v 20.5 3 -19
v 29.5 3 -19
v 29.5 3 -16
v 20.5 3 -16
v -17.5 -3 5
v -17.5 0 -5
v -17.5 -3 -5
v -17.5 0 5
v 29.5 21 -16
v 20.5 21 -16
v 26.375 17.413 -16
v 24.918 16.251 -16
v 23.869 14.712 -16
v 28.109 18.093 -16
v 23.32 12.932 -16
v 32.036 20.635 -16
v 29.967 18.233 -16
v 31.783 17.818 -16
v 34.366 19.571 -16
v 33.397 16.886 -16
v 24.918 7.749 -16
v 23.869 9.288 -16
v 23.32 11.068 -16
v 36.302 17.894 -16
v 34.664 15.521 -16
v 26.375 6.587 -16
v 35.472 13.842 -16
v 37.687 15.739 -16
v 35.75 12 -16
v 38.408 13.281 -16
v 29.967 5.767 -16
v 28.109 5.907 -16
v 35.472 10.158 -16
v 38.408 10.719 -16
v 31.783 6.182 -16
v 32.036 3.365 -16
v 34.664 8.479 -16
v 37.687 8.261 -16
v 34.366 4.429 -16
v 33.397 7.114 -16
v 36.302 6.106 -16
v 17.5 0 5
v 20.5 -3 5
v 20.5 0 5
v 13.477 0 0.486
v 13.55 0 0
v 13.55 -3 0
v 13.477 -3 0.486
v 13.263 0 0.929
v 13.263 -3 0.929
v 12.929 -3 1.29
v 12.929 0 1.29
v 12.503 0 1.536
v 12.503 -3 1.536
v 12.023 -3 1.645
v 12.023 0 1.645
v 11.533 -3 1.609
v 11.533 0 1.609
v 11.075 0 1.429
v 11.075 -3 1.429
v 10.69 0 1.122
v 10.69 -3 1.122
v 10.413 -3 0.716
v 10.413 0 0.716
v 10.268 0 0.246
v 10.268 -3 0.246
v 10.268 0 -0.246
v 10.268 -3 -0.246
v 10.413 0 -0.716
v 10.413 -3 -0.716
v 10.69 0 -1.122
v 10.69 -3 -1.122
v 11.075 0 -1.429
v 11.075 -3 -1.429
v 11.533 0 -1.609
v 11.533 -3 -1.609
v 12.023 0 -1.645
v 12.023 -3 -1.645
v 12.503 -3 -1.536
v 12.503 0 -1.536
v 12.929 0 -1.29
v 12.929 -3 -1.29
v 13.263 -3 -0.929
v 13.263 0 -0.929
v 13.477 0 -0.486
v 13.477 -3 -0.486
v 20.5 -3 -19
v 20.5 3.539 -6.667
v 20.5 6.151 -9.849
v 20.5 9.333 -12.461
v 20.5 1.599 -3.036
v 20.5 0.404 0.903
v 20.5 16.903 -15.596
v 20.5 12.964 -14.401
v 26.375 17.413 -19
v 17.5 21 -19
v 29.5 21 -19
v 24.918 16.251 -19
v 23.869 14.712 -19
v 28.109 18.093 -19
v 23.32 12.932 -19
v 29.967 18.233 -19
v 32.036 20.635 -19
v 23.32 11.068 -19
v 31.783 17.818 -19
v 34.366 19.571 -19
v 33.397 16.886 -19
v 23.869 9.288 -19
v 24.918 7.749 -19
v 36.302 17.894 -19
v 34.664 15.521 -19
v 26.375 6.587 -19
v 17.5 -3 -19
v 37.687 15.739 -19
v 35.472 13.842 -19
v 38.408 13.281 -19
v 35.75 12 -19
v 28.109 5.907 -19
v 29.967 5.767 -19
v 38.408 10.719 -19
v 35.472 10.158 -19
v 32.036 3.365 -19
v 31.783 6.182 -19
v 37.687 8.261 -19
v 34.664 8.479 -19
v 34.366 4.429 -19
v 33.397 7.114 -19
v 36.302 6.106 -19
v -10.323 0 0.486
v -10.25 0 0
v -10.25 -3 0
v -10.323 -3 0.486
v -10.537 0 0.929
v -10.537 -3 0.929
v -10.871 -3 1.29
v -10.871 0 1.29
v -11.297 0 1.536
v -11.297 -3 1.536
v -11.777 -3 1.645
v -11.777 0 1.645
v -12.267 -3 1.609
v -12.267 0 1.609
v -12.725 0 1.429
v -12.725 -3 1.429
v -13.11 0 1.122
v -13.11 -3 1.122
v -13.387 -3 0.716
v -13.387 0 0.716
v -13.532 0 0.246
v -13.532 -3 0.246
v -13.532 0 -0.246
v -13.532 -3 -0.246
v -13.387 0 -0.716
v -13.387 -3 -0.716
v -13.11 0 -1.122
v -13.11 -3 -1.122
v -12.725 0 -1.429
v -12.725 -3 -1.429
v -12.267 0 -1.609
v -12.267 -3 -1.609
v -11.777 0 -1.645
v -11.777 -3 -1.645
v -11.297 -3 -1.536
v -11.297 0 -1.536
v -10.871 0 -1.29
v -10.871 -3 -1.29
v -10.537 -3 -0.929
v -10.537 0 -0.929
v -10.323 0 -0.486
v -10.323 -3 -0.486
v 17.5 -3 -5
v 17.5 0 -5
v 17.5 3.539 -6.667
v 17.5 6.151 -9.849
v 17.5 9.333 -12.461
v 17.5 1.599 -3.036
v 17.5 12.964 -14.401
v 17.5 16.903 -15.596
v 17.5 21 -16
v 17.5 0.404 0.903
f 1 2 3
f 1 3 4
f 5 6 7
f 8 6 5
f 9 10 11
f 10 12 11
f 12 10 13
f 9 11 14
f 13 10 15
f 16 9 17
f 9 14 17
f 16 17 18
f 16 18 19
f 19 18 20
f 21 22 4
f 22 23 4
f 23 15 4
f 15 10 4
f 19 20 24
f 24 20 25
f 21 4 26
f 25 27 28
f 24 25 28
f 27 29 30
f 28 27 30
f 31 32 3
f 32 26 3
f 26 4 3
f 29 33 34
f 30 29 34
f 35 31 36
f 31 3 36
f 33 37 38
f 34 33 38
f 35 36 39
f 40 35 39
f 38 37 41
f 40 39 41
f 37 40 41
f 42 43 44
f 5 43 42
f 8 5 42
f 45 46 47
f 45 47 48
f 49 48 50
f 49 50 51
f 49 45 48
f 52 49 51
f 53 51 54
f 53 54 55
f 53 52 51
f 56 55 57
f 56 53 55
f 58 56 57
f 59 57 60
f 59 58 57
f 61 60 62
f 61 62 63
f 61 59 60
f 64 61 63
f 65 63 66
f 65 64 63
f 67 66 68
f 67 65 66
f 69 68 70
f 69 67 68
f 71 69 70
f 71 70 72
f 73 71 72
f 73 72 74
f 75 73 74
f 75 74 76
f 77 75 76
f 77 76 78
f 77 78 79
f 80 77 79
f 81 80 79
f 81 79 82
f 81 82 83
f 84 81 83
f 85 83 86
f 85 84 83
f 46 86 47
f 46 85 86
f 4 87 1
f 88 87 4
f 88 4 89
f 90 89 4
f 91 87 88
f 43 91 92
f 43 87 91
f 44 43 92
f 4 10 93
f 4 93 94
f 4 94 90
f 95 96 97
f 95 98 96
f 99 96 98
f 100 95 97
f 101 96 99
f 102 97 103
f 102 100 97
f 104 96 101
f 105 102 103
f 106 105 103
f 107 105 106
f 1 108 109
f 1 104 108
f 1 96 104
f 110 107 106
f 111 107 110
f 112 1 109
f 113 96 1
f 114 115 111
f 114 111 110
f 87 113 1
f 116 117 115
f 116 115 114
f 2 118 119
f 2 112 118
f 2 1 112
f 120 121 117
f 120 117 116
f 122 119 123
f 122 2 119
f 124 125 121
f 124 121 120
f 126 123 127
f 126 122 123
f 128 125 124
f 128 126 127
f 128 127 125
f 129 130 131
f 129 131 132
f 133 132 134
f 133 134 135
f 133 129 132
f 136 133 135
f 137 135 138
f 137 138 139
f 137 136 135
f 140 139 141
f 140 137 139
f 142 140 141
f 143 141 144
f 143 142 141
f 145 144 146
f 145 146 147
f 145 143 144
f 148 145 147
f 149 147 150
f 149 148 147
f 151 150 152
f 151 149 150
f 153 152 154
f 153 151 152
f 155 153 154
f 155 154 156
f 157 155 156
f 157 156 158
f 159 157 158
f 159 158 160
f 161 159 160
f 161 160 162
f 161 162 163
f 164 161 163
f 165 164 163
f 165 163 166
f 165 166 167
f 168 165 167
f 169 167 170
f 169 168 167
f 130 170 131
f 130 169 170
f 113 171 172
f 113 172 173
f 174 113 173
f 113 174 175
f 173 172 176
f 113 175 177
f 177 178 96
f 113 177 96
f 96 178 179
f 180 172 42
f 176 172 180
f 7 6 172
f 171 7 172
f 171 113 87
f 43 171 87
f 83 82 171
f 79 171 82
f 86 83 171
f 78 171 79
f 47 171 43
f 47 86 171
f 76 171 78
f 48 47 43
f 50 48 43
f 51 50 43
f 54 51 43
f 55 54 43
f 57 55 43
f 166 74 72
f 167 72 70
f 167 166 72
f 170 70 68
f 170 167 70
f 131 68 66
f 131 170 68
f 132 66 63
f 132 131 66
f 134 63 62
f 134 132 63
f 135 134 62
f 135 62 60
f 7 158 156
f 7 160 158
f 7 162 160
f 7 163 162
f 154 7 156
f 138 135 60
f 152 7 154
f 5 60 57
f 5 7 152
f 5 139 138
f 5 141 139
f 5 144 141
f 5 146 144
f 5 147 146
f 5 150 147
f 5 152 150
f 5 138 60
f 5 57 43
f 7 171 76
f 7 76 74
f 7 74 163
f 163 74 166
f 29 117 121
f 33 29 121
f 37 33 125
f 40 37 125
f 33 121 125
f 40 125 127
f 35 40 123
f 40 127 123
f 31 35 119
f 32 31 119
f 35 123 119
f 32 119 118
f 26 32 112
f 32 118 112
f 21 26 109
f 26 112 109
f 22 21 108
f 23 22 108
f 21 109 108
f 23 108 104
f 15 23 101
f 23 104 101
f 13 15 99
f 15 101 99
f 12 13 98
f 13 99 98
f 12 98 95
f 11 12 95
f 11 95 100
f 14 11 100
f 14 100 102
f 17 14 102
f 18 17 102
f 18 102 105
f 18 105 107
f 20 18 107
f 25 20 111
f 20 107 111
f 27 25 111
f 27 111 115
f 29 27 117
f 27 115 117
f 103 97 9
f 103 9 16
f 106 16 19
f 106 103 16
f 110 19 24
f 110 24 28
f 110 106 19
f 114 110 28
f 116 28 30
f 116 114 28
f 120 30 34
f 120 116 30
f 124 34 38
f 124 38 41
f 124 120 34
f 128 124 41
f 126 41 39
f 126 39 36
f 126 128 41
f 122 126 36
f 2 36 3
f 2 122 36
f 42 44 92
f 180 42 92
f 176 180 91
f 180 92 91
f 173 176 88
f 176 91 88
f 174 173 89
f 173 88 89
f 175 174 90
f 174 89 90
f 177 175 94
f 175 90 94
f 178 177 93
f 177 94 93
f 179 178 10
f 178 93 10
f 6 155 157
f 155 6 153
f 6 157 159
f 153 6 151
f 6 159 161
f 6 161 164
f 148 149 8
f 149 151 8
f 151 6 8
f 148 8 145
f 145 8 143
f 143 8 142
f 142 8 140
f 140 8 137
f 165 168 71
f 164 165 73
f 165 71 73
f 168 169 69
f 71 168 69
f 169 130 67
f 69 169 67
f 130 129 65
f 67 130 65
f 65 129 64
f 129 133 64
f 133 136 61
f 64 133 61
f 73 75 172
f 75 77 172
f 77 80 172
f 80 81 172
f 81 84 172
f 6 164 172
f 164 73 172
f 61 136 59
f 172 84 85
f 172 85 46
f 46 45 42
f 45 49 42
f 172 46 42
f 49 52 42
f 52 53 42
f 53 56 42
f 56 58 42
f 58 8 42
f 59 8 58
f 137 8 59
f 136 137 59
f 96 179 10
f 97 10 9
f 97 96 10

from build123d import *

# Parameters (mm, degrees)
F0_W     = 35
F0_H     = 10
F0_R     = 1.65
F1_DEPTH = 3
F2_W     = 24
F2_H     = 24
F3_DEPTH = 3
F4_R     = 6.25
F5_DEPTH = 3
F6_R     = 21
F7_DEPTH = 3


with BuildPart() as f1:
    # F0 (on Front) → F1 (new body)
    with BuildSketch(Plane.XZ):
        Rectangle(F0_W, F0_H)
        with Locations((-11.9, 0)):
            Circle(F0_R, mode=Mode.SUBTRACT)
        with Locations((11.9, 0)):
            Circle(F0_R, mode=Mode.SUBTRACT)
    extrude(amount=F1_DEPTH)

    # F2 (on face) → F3 (join)
    with BuildSketch(Plane.YZ.offset(17.5)):
        with Locations((9, -7)):
            Rectangle(F2_W, F2_H)
    extrude(amount=F3_DEPTH)

    # F4 (on face) → F5 (join)
    with BuildSketch(Plane(origin=(0, 0, -19), x_dir=(1, 0, 0), z_dir=(0, 0, -1))):
        with BuildLine():
            Line((20.5, -21), (29.5, -21))
            ThreePointArc((29.5, -21), (38.5, -12), (29.5, -3))
            Line((29.5, -3), (20.5, -3))
            Line((20.5, -3), (20.5, -21))
        make_face()
        with Locations((29.5, -12)):
            Circle(F4_R, mode=Mode.SUBTRACT)
    extrude(amount=-F5_DEPTH)

    # F6 (on face) → F7 (cut)
    with BuildSketch(Plane.YZ.offset(20.5)):
        with Locations((21, 5)):
            Circle(F6_R)
    extrude(amount=-F7_DEPTH, mode=Mode.SUBTRACT)


solid = f1.part
